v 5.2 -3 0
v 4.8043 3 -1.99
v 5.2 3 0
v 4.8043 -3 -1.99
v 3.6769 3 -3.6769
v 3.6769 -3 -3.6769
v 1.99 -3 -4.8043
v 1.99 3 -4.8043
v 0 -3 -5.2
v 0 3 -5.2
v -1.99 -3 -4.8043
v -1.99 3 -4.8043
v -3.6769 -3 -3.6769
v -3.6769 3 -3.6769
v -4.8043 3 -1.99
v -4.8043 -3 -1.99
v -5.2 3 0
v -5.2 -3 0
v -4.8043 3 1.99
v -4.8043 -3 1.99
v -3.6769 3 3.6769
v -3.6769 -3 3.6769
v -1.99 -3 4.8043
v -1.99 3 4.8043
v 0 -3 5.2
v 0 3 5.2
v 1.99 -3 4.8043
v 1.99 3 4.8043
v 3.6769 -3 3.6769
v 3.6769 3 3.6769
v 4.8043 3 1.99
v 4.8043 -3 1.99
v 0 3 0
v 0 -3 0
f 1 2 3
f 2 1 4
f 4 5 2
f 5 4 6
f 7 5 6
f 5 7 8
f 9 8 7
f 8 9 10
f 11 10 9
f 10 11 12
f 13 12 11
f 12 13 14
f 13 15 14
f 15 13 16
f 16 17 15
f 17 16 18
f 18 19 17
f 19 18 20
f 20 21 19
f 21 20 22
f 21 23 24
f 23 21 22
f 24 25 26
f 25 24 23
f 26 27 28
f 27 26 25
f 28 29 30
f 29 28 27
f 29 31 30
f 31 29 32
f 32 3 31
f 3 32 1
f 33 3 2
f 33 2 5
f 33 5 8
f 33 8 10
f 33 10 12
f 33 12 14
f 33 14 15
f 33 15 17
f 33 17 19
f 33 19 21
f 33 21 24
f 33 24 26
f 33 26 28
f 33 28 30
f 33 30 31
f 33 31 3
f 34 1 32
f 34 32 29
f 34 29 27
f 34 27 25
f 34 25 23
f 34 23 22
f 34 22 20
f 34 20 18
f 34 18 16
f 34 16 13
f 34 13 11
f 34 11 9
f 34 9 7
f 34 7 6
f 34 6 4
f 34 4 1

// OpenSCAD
// file: ../p/4-4edge.scad
use <../lib.scad>
function ldraw_lib__4_4edge() = [
// 0 Circle 1.0
// 0 Name: 4-4edge.dat
// 0 Author: James Jessiman
// 0 !LDRAW_ORG Primitive UPDATE 2017-01
// 0 !LICENSE Licensed under CC BY 2.0 and CC BY 4.0 : see CAreadme.txt
// 
// 0 BFC CERTIFY CCW
  [0,"BFC","CERTIFY"],
  [0,"BFC","CCW"],
// 
// 0 !HISTORY 1998-12-15 [PTadmin] Official Update 1998-10
// 0 !HISTORY 2005-12-28 [PTadmin] Official Update 2005-01
// 0 !HISTORY 2007-06-24 [PTadmin] Header formatted for Contributor Agreement
// 0 !HISTORY 2008-07-01 [PTadmin] Official Update 2008-01
// 0 !HISTORY 2017-01-15 [Steffen] BFCed
// 0 !HISTORY 2017-12-30 [PTadmin] Official Update 2017-01
// 
// 
// 2 24 1 0 0 0.9239 0 0.3827
  [2,24,1,0,0,0.9239,0,0.3827],
// 2 24 0.9239 0 0.3827 0.7071 0 0.7071
  [2,24,0.9239,0,0.3827,0.7071,0,0.7071],
// 2 24 0.7071 0 0.7071 0.3827 0 0.9239
  [2,24,0.7071,0,0.7071,0.3827,0,0.9239],
// 2 24 0.3827 0 0.9239 0 0 1
  [2,24,0.3827,0,0.9239,0,0,1],
// 2 24 0 0 1 -0.3827 0 0.9239
  [2,24,0,0,1,-0.3827,0,0.9239],
// 2 24 -0.3827 0 0.9239 -0.7071 0 0.7071
  [2,24,-0.3827,0,0.9239,-0.7071,0,0.7071],
// 2 24 -0.7071 0 0.7071 -0.9239 0 0.3827
  [2,24,-0.7071,0,0.7071,-0.9239,0,0.3827],
// 2 24 -0.9239 0 0.3827 -1 0 -0
  [2,24,-0.9239,0,0.3827,-1,0,-0],
// 2 24 -1 0 -0 -0.9239 0 -0.3827
  [2,24,-1,0,-0,-0.9239,0,-0.3827],
// 2 24 -0.9239 0 -0.3827 -0.7071 0 -0.7071
  [2,24,-0.9239,0,-0.3827,-0.7071,0,-0.7071],
// 2 24 -0.7071 0 -0.7071 -0.3827 0 -0.9239
  [2,24,-0.7071,0,-0.7071,-0.3827,0,-0.9239],
// 2 24 -0.3827 0 -0.9239 0 0 -1
  [2,24,-0.3827,0,-0.9239,0,0,-1],
// 2 24 0 0 -1 0.3827 0 -0.9239
  [2,24,0,0,-1,0.3827,0,-0.9239],
// 2 24 0.3827 0 -0.9239 0.7071 0 -0.7071
  [2,24,0.3827,0,-0.9239,0.7071,0,-0.7071],
// 2 24 0.7071 0 -0.7071 0.9239 0 -0.3827
  [2,24,0.7071,0,-0.7071,0.9239,0,-0.3827],
// 2 24 0.9239 0 -0.3827 1 0 0
  [2,24,0.9239,0,-0.3827,1,0,0],
];
module ldraw_lib__4_4edge(step=0, col=false, unit=2/5, alt=false, line=0.2, solid=!$preview)
    makepoly(ldraw_lib__4_4edge(), step=step, col=col, unit=unit, alt=alt, line=line, solid=solid);
ldraw_lib__4_4edge(line=0.2);
// file: ../p/4-4disc.scad
use <../lib.scad>
function ldraw_lib__4_4disc() = [
// 0 Disc 1.0
// 0 Name: 4-4disc.dat
// 0 Author: James Jessiman
// 0 !LDRAW_ORG Primitive UPDATE 2002-02
// 0 !LICENSE Licensed under CC BY 2.0 and CC BY 4.0 : see CAreadme.txt
// 
// 0 BFC CERTIFY CCW
  [0,"BFC","CERTIFY"],
  [0,"BFC","CCW"],
// 
// 0 !HISTORY 1998-12-15 [PTadmin] Official Update 1998-10
// 0 !HISTORY 2002-03-23 [sbliss] Added BFC statement
// 0 !HISTORY 2002-04-25 [PTadmin] Official Update 2002-02
// 0 !HISTORY 2007-06-24 [PTadmin] Header formatted for Contributor Agreement
// 0 !HISTORY 2008-07-01 [PTadmin] Official Update 2008-01
// 
// 
// 3 16 0 0 0 1 0 0 0.9239 0 0.3827
  [3,16,0,0,0,1,0,0,0.9239,0,0.3827],
// 3 16 0 0 0 0.9239 0 0.3827 0.7071 0 0.7071
  [3,16,0,0,0,0.9239,0,0.3827,0.7071,0,0.7071],
// 3 16 0 0 0 0.7071 0 0.7071 0.3827 0 0.9239
  [3,16,0,0,0,0.7071,0,0.7071,0.3827,0,0.9239],
// 3 16 0 0 0 0.3827 0 0.9239 0 0 1
  [3,16,0,0,0,0.3827,0,0.9239,0,0,1],
// 3 16 0 0 0 0 0 1 -0.3827 0 0.9239
  [3,16,0,0,0,0,0,1,-0.3827,0,0.9239],
// 3 16 0 0 0 -0.3827 0 0.9239 -0.7071 0 0.7071
  [3,16,0,0,0,-0.3827,0,0.9239,-0.7071,0,0.7071],
// 3 16 0 0 0 -0.7071 0 0.7071 -0.9239 0 0.3827
  [3,16,0,0,0,-0.7071,0,0.7071,-0.9239,0,0.3827],
// 3 16 0 0 0 -0.9239 0 0.3827 -1 0 -0
  [3,16,0,0,0,-0.9239,0,0.3827,-1,0,-0],
// 3 16 0 0 0 -1 0 -0 -0.9239 0 -0.3827
  [3,16,0,0,0,-1,0,-0,-0.9239,0,-0.3827],
// 3 16 0 0 0 -0.9239 0 -0.3827 -0.7071 0 -0.7071
  [3,16,0,0,0,-0.9239,0,-0.3827,-0.7071,0,-0.7071],
// 3 16 0 0 0 -0.7071 0 -0.7071 -0.3827 0 -0.9239
  [3,16,0,0,0,-0.7071,0,-0.7071,-0.3827,0,-0.9239],
// 3 16 0 0 0 -0.3827 0 -0.9239 0 0 -1
  [3,16,0,0,0,-0.3827,0,-0.9239,0,0,-1],
// 3 16 0 0 0 0 0 -1 0.3827 0 -0.9239
  [3,16,0,0,0,0,0,-1,0.3827,0,-0.9239],
// 3 16 0 0 0 0.3827 0 -0.9239 0.7071 0 -0.7071
  [3,16,0,0,0,0.3827,0,-0.9239,0.7071,0,-0.7071],
// 3 16 0 0 0 0.7071 0 -0.7071 0.9239 0 -0.3827
  [3,16,0,0,0,0.7071,0,-0.7071,0.9239,0,-0.3827],
// 3 16 0 0 0 0.9239 0 -0.3827 1 0 0
  [3,16,0,0,0,0.9239,0,-0.3827,1,0,0],
// 0
];
module ldraw_lib__4_4disc(step=0, col=false, unit=2/5, alt=false, line=0.2, solid=!$preview)
    makepoly(ldraw_lib__4_4disc(), step=step, col=col, unit=unit, alt=alt, line=line, solid=solid);
ldraw_lib__4_4disc(line=0.2);
// file: ../p/4-4cyli.scad
use <../lib.scad>
function ldraw_lib__4_4cyli() = [
// 0 Cylinder 1.0
// 0 Name: 4-4cyli.dat
// 0 Author: James Jessiman
// 0 !LDRAW_ORG Primitive UPDATE 2005-01
// 0 !LICENSE Licensed under CC BY 2.0 and CC BY 4.0 : see CAreadme.txt
// 
// 0 BFC CERTIFY CCW
  [0,"BFC","CERTIFY"],
  [0,"BFC","CCW"],
// 
// 0 !HISTORY 1998-12-15 [PTadmin] Official Update 1998-10
// 0 !HISTORY 2002-03-23 [sbliss] Added BFC statement; merged headers from files in distributions LDraw 0.27 and Complete.
// 0 !HISTORY 2002-04-25 [PTadmin] Official Update 2002-02
// 0 !HISTORY 2004-12-14 [guyvivan] BFC CCW
// 0 !HISTORY 2005-12-28 [PTadmin] Official Update 2005-01
// 0 !HISTORY 2007-06-24 [PTadmin] Header formatted for Contributor Agreement
// 0 !HISTORY 2008-07-01 [PTadmin] Official Update 2008-01
// 
// 
// 4 16 1 1 0 0.9239 1 0.3827 0.9239 0 0.3827 1 0 0
  [4,16,1,1,0,0.9239,1,0.3827,0.9239,0,0.3827,1,0,0],
// 5 24 1 0 0 1 1 0 0.9239 0 0.3827 0.9239 0 -0.3827
  [5,24,1,0,0,1,1,0,0.9239,0,0.3827,0.9239,0,-0.3827],
// 4 16 0.9239 1 0.3827 0.7071 1 0.7071 0.7071 0 0.7071 0.9239 0 0.3827
  [4,16,0.9239,1,0.3827,0.7071,1,0.7071,0.7071,0,0.7071,0.9239,0,0.3827],
// 5 24 0.9239 0 0.3827 0.9239 1 0.3827 0.7071 0 0.7071 1 0 0
  [5,24,0.9239,0,0.3827,0.9239,1,0.3827,0.7071,0,0.7071,1,0,0],
// 4 16 0.7071 1 0.7071 0.3827 1 0.9239 0.3827 0 0.9239 0.7071 0 0.7071
  [4,16,0.7071,1,0.7071,0.3827,1,0.9239,0.3827,0,0.9239,0.7071,0,0.7071],
// 5 24 0.7071 0 0.7071 0.7071 1 0.7071 0.3827 0 0.9239 0.9239 0 0.3827
  [5,24,0.7071,0,0.7071,0.7071,1,0.7071,0.3827,0,0.9239,0.9239,0,0.3827],
// 4 16 0.3827 1 0.9239 0 1 1 0 0 1 0.3827 0 0.9239
  [4,16,0.3827,1,0.9239,0,1,1,0,0,1,0.3827,0,0.9239],
// 5 24 0.3827 0 0.9239 0.3827 1 0.9239 0 0 1 0.7071 0 0.7071
  [5,24,0.3827,0,0.9239,0.3827,1,0.9239,0,0,1,0.7071,0,0.7071],
// 4 16 0 1 1 -0.3827 1 0.9239 -0.3827 0 0.9239 0 0 1
  [4,16,0,1,1,-0.3827,1,0.9239,-0.3827,0,0.9239,0,0,1],
// 5 24 0 0 1 0 1 1 -0.3827 0 0.9239 0.3827 0 0.9239
  [5,24,0,0,1,0,1,1,-0.3827,0,0.9239,0.3827,0,0.9239],
// 4 16 -0.3827 1 0.9239 -0.7071 1 0.7071 -0.7071 0 0.7071 -0.3827 0 0.9239
  [4,16,-0.3827,1,0.9239,-0.7071,1,0.7071,-0.7071,0,0.7071,-0.3827,0,0.9239],
// 5 24 -0.3827 0 0.9239 -0.3827 1 0.9239 -0.7071 0 0.7071 0 0 1
  [5,24,-0.3827,0,0.9239,-0.3827,1,0.9239,-0.7071,0,0.7071,0,0,1],
// 4 16 -0.7071 1 0.7071 -0.9239 1 0.3827 -0.9239 0 0.3827 -0.7071 0 0.7071
  [4,16,-0.7071,1,0.7071,-0.9239,1,0.3827,-0.9239,0,0.3827,-0.7071,0,0.7071],
// 5 24 -0.7071 0 0.7071 -0.7071 1 0.7071 -0.9239 0 0.3827 -0.3827 0 0.9239
  [5,24,-0.7071,0,0.7071,-0.7071,1,0.7071,-0.9239,0,0.3827,-0.3827,0,0.9239],
// 4 16 -0.9239 1 0.3827 -1 1 0 -1 0 0 -0.9239 0 0.3827
  [4,16,-0.9239,1,0.3827,-1,1,0,-1,0,0,-0.9239,0,0.3827],
// 5 24 -0.9239 0 0.3827 -0.9239 1 0.3827 -1 0 0 -0.7071 0 0.7071
  [5,24,-0.9239,0,0.3827,-0.9239,1,0.3827,-1,0,0,-0.7071,0,0.7071],
// 4 16 -1 1 0 -0.9239 1 -0.3827 -0.9239 0 -0.3827 -1 0 0
  [4,16,-1,1,0,-0.9239,1,-0.3827,-0.9239,0,-0.3827,-1,0,0],
// 5 24 -1 0 0 -1 1 0 -0.9239 0 -0.3827 -0.9239 0 0.3827
  [5,24,-1,0,0,-1,1,0,-0.9239,0,-0.3827,-0.9239,0,0.3827],
// 4 16 -0.9239 1 -0.3827 -0.7071 1 -0.7071 -0.7071 0 -0.7071 -0.9239 0 -0.3827
  [4,16,-0.9239,1,-0.3827,-0.7071,1,-0.7071,-0.7071,0,-0.7071,-0.9239,0,-0.3827],
// 5 24 -0.9239 0 -0.3827 -0.9239 1 -0.3827 -0.7071 0 -0.7071 -1 0 0
  [5,24,-0.9239,0,-0.3827,-0.9239,1,-0.3827,-0.7071,0,-0.7071,-1,0,0],
// 4 16 -0.7071 1 -0.7071 -0.3827 1 -0.9239 -0.3827 0 -0.9239 -0.7071 0 -0.7071
  [4,16,-0.7071,1,-0.7071,-0.3827,1,-0.9239,-0.3827,0,-0.9239,-0.7071,0,-0.7071],
// 5 24 -0.7071 0 -0.7071 -0.7071 1 -0.7071 -0.3827 0 -0.9239 -0.9239 0 -0.3827
  [5,24,-0.7071,0,-0.7071,-0.7071,1,-0.7071,-0.3827,0,-0.9239,-0.9239,0,-0.3827],
// 4 16 -0.3827 1 -0.9239 0 1 -1 0 0 -1 -0.3827 0 -0.9239
  [4,16,-0.3827,1,-0.9239,0,1,-1,0,0,-1,-0.3827,0,-0.9239],
// 5 24 -0.3827 0 -0.9239 -0.3827 1 -0.9239 0 0 -1 -0.7071 0 -0.7071
  [5,24,-0.3827,0,-0.9239,-0.3827,1,-0.9239,0,0,-1,-0.7071,0,-0.7071],
// 4 16 0 1 -1 0.3827 1 -0.9239 0.3827 0 -0.9239 0 0 -1
  [4,16,0,1,-1,0.3827,1,-0.9239,0.3827,0,-0.9239,0,0,-1],
// 5 24 0 0 -1 0 1 -1 0.3827 0 -0.9239 -0.3827 0 -0.9239
  [5,24,0,0,-1,0,1,-1,0.3827,0,-0.9239,-0.3827,0,-0.9239],
// 4 16 0.3827 1 -0.9239 0.7071 1 -0.7071 0.7071 0 -0.7071 0.3827 0 -0.9239
  [4,16,0.3827,1,-0.9239,0.7071,1,-0.7071,0.7071,0,-0.7071,0.3827,0,-0.9239],
// 5 24 0.3827 0 -0.9239 0.3827 1 -0.9239 0.7071 0 -0.7071 0 0 -1
  [5,24,0.3827,0,-0.9239,0.3827,1,-0.9239,0.7071,0,-0.7071,0,0,-1],
// 4 16 0.7071 1 -0.7071 0.9239 1 -0.3827 0.9239 0 -0.3827 0.7071 0 -0.7071
  [4,16,0.7071,1,-0.7071,0.9239,1,-0.3827,0.9239,0,-0.3827,0.7071,0,-0.7071],
// 5 24 0.7071 0 -0.7071 0.7071 1 -0.7071 0.9239 0 -0.3827 0.3827 0 -0.9239
  [5,24,0.7071,0,-0.7071,0.7071,1,-0.7071,0.9239,0,-0.3827,0.3827,0,-0.9239],
// 4 16 0.9239 1 -0.3827 1 1 0 1 0 0 0.9239 0 -0.3827
  [4,16,0.9239,1,-0.3827,1,1,0,1,0,0,0.9239,0,-0.3827],
// 5 24 0.9239 0 -0.3827 0.9239 1 -0.3827 1 0 0 0.7071 0 -0.7071
  [5,24,0.9239,0,-0.3827,0.9239,1,-0.3827,1,0,0,0.7071,0,-0.7071],
// 0
];
module ldraw_lib__4_4cyli(step=0, col=false, unit=2/5, alt=false, line=0.2, solid=!$preview)
    makepoly(ldraw_lib__4_4cyli(), step=step, col=col, unit=unit, alt=alt, line=line, solid=solid);
ldraw_lib__4_4cyli(line=0.2);
// main file
use <../lib.scad>
use <../p/4-4cyli.scad>
use <../p/4-4disc.scad>
use <../p/4-4edge.scad>
function ldraw_lib__u9044() = [
// 0 ~Magnet Cylindrical  1.3 x  1.3
// 0 Name: u9044.dat
// 0 Author: Chris Dee [cwdee]
// 0 !LDRAW_ORG Part UPDATE 2012-01
// 0 !LICENSE Licensed under CC BY 2.0 and CC BY 4.0 : see CAreadme.txt
// 
// 0 BFC CERTIFY CW
  [0,"BFC","CERTIFY"],
  [0,"BFC","CW"],
// 
// 0 !CMDLINE -c493
// 
// 0 !HISTORY 2011-12-18 [Steffen] added cmdline for new magnet material 493
// 0 !HISTORY 2012-03-30 [PTadmin] Official Update 2012-01
// 
// 
// 1 16 0 0 -7.5 13 0 0 0 0 13 0 15 0 4-4cyli.dat
  [1,16,0,0,-7.5,13,0,0,0,0,13,0,15,0, ldraw_lib__4_4cyli()],
// 1 16 0 0 7.5 13 0 0 0 0 13 0 1 0 4-4edge.dat
  [1,16,0,0,7.5,13,0,0,0,0,13,0,1,0, ldraw_lib__4_4edge()],
// 1 16 0 0 7.5 13 0 0 0 0 13 0 -1 0 4-4disc.dat
  [1,16,0,0,7.5,13,0,0,0,0,13,0,-1,0, ldraw_lib__4_4disc()],
// 1 16 0 0 -7.5 13 0 0 0 0 -13 0 1 0 4-4edge.dat
  [1,16,0,0,-7.5,13,0,0,0,0,-13,0,1,0, ldraw_lib__4_4edge()],
// 1 16 0 0 -7.5 13 0 0 0 0 -13 0 1 0 4-4disc.dat
  [1,16,0,0,-7.5,13,0,0,0,0,-13,0,1,0, ldraw_lib__4_4disc()],
];
module ldraw_lib__u9044(step=0, col=false, unit=2/5, alt=false, line=0.2, solid=!$preview)
    makepoly(ldraw_lib__u9044(), step=step, col=col, unit=unit, alt=alt, line=line, solid=solid);
ldraw_lib__u9044(line=0.2);
